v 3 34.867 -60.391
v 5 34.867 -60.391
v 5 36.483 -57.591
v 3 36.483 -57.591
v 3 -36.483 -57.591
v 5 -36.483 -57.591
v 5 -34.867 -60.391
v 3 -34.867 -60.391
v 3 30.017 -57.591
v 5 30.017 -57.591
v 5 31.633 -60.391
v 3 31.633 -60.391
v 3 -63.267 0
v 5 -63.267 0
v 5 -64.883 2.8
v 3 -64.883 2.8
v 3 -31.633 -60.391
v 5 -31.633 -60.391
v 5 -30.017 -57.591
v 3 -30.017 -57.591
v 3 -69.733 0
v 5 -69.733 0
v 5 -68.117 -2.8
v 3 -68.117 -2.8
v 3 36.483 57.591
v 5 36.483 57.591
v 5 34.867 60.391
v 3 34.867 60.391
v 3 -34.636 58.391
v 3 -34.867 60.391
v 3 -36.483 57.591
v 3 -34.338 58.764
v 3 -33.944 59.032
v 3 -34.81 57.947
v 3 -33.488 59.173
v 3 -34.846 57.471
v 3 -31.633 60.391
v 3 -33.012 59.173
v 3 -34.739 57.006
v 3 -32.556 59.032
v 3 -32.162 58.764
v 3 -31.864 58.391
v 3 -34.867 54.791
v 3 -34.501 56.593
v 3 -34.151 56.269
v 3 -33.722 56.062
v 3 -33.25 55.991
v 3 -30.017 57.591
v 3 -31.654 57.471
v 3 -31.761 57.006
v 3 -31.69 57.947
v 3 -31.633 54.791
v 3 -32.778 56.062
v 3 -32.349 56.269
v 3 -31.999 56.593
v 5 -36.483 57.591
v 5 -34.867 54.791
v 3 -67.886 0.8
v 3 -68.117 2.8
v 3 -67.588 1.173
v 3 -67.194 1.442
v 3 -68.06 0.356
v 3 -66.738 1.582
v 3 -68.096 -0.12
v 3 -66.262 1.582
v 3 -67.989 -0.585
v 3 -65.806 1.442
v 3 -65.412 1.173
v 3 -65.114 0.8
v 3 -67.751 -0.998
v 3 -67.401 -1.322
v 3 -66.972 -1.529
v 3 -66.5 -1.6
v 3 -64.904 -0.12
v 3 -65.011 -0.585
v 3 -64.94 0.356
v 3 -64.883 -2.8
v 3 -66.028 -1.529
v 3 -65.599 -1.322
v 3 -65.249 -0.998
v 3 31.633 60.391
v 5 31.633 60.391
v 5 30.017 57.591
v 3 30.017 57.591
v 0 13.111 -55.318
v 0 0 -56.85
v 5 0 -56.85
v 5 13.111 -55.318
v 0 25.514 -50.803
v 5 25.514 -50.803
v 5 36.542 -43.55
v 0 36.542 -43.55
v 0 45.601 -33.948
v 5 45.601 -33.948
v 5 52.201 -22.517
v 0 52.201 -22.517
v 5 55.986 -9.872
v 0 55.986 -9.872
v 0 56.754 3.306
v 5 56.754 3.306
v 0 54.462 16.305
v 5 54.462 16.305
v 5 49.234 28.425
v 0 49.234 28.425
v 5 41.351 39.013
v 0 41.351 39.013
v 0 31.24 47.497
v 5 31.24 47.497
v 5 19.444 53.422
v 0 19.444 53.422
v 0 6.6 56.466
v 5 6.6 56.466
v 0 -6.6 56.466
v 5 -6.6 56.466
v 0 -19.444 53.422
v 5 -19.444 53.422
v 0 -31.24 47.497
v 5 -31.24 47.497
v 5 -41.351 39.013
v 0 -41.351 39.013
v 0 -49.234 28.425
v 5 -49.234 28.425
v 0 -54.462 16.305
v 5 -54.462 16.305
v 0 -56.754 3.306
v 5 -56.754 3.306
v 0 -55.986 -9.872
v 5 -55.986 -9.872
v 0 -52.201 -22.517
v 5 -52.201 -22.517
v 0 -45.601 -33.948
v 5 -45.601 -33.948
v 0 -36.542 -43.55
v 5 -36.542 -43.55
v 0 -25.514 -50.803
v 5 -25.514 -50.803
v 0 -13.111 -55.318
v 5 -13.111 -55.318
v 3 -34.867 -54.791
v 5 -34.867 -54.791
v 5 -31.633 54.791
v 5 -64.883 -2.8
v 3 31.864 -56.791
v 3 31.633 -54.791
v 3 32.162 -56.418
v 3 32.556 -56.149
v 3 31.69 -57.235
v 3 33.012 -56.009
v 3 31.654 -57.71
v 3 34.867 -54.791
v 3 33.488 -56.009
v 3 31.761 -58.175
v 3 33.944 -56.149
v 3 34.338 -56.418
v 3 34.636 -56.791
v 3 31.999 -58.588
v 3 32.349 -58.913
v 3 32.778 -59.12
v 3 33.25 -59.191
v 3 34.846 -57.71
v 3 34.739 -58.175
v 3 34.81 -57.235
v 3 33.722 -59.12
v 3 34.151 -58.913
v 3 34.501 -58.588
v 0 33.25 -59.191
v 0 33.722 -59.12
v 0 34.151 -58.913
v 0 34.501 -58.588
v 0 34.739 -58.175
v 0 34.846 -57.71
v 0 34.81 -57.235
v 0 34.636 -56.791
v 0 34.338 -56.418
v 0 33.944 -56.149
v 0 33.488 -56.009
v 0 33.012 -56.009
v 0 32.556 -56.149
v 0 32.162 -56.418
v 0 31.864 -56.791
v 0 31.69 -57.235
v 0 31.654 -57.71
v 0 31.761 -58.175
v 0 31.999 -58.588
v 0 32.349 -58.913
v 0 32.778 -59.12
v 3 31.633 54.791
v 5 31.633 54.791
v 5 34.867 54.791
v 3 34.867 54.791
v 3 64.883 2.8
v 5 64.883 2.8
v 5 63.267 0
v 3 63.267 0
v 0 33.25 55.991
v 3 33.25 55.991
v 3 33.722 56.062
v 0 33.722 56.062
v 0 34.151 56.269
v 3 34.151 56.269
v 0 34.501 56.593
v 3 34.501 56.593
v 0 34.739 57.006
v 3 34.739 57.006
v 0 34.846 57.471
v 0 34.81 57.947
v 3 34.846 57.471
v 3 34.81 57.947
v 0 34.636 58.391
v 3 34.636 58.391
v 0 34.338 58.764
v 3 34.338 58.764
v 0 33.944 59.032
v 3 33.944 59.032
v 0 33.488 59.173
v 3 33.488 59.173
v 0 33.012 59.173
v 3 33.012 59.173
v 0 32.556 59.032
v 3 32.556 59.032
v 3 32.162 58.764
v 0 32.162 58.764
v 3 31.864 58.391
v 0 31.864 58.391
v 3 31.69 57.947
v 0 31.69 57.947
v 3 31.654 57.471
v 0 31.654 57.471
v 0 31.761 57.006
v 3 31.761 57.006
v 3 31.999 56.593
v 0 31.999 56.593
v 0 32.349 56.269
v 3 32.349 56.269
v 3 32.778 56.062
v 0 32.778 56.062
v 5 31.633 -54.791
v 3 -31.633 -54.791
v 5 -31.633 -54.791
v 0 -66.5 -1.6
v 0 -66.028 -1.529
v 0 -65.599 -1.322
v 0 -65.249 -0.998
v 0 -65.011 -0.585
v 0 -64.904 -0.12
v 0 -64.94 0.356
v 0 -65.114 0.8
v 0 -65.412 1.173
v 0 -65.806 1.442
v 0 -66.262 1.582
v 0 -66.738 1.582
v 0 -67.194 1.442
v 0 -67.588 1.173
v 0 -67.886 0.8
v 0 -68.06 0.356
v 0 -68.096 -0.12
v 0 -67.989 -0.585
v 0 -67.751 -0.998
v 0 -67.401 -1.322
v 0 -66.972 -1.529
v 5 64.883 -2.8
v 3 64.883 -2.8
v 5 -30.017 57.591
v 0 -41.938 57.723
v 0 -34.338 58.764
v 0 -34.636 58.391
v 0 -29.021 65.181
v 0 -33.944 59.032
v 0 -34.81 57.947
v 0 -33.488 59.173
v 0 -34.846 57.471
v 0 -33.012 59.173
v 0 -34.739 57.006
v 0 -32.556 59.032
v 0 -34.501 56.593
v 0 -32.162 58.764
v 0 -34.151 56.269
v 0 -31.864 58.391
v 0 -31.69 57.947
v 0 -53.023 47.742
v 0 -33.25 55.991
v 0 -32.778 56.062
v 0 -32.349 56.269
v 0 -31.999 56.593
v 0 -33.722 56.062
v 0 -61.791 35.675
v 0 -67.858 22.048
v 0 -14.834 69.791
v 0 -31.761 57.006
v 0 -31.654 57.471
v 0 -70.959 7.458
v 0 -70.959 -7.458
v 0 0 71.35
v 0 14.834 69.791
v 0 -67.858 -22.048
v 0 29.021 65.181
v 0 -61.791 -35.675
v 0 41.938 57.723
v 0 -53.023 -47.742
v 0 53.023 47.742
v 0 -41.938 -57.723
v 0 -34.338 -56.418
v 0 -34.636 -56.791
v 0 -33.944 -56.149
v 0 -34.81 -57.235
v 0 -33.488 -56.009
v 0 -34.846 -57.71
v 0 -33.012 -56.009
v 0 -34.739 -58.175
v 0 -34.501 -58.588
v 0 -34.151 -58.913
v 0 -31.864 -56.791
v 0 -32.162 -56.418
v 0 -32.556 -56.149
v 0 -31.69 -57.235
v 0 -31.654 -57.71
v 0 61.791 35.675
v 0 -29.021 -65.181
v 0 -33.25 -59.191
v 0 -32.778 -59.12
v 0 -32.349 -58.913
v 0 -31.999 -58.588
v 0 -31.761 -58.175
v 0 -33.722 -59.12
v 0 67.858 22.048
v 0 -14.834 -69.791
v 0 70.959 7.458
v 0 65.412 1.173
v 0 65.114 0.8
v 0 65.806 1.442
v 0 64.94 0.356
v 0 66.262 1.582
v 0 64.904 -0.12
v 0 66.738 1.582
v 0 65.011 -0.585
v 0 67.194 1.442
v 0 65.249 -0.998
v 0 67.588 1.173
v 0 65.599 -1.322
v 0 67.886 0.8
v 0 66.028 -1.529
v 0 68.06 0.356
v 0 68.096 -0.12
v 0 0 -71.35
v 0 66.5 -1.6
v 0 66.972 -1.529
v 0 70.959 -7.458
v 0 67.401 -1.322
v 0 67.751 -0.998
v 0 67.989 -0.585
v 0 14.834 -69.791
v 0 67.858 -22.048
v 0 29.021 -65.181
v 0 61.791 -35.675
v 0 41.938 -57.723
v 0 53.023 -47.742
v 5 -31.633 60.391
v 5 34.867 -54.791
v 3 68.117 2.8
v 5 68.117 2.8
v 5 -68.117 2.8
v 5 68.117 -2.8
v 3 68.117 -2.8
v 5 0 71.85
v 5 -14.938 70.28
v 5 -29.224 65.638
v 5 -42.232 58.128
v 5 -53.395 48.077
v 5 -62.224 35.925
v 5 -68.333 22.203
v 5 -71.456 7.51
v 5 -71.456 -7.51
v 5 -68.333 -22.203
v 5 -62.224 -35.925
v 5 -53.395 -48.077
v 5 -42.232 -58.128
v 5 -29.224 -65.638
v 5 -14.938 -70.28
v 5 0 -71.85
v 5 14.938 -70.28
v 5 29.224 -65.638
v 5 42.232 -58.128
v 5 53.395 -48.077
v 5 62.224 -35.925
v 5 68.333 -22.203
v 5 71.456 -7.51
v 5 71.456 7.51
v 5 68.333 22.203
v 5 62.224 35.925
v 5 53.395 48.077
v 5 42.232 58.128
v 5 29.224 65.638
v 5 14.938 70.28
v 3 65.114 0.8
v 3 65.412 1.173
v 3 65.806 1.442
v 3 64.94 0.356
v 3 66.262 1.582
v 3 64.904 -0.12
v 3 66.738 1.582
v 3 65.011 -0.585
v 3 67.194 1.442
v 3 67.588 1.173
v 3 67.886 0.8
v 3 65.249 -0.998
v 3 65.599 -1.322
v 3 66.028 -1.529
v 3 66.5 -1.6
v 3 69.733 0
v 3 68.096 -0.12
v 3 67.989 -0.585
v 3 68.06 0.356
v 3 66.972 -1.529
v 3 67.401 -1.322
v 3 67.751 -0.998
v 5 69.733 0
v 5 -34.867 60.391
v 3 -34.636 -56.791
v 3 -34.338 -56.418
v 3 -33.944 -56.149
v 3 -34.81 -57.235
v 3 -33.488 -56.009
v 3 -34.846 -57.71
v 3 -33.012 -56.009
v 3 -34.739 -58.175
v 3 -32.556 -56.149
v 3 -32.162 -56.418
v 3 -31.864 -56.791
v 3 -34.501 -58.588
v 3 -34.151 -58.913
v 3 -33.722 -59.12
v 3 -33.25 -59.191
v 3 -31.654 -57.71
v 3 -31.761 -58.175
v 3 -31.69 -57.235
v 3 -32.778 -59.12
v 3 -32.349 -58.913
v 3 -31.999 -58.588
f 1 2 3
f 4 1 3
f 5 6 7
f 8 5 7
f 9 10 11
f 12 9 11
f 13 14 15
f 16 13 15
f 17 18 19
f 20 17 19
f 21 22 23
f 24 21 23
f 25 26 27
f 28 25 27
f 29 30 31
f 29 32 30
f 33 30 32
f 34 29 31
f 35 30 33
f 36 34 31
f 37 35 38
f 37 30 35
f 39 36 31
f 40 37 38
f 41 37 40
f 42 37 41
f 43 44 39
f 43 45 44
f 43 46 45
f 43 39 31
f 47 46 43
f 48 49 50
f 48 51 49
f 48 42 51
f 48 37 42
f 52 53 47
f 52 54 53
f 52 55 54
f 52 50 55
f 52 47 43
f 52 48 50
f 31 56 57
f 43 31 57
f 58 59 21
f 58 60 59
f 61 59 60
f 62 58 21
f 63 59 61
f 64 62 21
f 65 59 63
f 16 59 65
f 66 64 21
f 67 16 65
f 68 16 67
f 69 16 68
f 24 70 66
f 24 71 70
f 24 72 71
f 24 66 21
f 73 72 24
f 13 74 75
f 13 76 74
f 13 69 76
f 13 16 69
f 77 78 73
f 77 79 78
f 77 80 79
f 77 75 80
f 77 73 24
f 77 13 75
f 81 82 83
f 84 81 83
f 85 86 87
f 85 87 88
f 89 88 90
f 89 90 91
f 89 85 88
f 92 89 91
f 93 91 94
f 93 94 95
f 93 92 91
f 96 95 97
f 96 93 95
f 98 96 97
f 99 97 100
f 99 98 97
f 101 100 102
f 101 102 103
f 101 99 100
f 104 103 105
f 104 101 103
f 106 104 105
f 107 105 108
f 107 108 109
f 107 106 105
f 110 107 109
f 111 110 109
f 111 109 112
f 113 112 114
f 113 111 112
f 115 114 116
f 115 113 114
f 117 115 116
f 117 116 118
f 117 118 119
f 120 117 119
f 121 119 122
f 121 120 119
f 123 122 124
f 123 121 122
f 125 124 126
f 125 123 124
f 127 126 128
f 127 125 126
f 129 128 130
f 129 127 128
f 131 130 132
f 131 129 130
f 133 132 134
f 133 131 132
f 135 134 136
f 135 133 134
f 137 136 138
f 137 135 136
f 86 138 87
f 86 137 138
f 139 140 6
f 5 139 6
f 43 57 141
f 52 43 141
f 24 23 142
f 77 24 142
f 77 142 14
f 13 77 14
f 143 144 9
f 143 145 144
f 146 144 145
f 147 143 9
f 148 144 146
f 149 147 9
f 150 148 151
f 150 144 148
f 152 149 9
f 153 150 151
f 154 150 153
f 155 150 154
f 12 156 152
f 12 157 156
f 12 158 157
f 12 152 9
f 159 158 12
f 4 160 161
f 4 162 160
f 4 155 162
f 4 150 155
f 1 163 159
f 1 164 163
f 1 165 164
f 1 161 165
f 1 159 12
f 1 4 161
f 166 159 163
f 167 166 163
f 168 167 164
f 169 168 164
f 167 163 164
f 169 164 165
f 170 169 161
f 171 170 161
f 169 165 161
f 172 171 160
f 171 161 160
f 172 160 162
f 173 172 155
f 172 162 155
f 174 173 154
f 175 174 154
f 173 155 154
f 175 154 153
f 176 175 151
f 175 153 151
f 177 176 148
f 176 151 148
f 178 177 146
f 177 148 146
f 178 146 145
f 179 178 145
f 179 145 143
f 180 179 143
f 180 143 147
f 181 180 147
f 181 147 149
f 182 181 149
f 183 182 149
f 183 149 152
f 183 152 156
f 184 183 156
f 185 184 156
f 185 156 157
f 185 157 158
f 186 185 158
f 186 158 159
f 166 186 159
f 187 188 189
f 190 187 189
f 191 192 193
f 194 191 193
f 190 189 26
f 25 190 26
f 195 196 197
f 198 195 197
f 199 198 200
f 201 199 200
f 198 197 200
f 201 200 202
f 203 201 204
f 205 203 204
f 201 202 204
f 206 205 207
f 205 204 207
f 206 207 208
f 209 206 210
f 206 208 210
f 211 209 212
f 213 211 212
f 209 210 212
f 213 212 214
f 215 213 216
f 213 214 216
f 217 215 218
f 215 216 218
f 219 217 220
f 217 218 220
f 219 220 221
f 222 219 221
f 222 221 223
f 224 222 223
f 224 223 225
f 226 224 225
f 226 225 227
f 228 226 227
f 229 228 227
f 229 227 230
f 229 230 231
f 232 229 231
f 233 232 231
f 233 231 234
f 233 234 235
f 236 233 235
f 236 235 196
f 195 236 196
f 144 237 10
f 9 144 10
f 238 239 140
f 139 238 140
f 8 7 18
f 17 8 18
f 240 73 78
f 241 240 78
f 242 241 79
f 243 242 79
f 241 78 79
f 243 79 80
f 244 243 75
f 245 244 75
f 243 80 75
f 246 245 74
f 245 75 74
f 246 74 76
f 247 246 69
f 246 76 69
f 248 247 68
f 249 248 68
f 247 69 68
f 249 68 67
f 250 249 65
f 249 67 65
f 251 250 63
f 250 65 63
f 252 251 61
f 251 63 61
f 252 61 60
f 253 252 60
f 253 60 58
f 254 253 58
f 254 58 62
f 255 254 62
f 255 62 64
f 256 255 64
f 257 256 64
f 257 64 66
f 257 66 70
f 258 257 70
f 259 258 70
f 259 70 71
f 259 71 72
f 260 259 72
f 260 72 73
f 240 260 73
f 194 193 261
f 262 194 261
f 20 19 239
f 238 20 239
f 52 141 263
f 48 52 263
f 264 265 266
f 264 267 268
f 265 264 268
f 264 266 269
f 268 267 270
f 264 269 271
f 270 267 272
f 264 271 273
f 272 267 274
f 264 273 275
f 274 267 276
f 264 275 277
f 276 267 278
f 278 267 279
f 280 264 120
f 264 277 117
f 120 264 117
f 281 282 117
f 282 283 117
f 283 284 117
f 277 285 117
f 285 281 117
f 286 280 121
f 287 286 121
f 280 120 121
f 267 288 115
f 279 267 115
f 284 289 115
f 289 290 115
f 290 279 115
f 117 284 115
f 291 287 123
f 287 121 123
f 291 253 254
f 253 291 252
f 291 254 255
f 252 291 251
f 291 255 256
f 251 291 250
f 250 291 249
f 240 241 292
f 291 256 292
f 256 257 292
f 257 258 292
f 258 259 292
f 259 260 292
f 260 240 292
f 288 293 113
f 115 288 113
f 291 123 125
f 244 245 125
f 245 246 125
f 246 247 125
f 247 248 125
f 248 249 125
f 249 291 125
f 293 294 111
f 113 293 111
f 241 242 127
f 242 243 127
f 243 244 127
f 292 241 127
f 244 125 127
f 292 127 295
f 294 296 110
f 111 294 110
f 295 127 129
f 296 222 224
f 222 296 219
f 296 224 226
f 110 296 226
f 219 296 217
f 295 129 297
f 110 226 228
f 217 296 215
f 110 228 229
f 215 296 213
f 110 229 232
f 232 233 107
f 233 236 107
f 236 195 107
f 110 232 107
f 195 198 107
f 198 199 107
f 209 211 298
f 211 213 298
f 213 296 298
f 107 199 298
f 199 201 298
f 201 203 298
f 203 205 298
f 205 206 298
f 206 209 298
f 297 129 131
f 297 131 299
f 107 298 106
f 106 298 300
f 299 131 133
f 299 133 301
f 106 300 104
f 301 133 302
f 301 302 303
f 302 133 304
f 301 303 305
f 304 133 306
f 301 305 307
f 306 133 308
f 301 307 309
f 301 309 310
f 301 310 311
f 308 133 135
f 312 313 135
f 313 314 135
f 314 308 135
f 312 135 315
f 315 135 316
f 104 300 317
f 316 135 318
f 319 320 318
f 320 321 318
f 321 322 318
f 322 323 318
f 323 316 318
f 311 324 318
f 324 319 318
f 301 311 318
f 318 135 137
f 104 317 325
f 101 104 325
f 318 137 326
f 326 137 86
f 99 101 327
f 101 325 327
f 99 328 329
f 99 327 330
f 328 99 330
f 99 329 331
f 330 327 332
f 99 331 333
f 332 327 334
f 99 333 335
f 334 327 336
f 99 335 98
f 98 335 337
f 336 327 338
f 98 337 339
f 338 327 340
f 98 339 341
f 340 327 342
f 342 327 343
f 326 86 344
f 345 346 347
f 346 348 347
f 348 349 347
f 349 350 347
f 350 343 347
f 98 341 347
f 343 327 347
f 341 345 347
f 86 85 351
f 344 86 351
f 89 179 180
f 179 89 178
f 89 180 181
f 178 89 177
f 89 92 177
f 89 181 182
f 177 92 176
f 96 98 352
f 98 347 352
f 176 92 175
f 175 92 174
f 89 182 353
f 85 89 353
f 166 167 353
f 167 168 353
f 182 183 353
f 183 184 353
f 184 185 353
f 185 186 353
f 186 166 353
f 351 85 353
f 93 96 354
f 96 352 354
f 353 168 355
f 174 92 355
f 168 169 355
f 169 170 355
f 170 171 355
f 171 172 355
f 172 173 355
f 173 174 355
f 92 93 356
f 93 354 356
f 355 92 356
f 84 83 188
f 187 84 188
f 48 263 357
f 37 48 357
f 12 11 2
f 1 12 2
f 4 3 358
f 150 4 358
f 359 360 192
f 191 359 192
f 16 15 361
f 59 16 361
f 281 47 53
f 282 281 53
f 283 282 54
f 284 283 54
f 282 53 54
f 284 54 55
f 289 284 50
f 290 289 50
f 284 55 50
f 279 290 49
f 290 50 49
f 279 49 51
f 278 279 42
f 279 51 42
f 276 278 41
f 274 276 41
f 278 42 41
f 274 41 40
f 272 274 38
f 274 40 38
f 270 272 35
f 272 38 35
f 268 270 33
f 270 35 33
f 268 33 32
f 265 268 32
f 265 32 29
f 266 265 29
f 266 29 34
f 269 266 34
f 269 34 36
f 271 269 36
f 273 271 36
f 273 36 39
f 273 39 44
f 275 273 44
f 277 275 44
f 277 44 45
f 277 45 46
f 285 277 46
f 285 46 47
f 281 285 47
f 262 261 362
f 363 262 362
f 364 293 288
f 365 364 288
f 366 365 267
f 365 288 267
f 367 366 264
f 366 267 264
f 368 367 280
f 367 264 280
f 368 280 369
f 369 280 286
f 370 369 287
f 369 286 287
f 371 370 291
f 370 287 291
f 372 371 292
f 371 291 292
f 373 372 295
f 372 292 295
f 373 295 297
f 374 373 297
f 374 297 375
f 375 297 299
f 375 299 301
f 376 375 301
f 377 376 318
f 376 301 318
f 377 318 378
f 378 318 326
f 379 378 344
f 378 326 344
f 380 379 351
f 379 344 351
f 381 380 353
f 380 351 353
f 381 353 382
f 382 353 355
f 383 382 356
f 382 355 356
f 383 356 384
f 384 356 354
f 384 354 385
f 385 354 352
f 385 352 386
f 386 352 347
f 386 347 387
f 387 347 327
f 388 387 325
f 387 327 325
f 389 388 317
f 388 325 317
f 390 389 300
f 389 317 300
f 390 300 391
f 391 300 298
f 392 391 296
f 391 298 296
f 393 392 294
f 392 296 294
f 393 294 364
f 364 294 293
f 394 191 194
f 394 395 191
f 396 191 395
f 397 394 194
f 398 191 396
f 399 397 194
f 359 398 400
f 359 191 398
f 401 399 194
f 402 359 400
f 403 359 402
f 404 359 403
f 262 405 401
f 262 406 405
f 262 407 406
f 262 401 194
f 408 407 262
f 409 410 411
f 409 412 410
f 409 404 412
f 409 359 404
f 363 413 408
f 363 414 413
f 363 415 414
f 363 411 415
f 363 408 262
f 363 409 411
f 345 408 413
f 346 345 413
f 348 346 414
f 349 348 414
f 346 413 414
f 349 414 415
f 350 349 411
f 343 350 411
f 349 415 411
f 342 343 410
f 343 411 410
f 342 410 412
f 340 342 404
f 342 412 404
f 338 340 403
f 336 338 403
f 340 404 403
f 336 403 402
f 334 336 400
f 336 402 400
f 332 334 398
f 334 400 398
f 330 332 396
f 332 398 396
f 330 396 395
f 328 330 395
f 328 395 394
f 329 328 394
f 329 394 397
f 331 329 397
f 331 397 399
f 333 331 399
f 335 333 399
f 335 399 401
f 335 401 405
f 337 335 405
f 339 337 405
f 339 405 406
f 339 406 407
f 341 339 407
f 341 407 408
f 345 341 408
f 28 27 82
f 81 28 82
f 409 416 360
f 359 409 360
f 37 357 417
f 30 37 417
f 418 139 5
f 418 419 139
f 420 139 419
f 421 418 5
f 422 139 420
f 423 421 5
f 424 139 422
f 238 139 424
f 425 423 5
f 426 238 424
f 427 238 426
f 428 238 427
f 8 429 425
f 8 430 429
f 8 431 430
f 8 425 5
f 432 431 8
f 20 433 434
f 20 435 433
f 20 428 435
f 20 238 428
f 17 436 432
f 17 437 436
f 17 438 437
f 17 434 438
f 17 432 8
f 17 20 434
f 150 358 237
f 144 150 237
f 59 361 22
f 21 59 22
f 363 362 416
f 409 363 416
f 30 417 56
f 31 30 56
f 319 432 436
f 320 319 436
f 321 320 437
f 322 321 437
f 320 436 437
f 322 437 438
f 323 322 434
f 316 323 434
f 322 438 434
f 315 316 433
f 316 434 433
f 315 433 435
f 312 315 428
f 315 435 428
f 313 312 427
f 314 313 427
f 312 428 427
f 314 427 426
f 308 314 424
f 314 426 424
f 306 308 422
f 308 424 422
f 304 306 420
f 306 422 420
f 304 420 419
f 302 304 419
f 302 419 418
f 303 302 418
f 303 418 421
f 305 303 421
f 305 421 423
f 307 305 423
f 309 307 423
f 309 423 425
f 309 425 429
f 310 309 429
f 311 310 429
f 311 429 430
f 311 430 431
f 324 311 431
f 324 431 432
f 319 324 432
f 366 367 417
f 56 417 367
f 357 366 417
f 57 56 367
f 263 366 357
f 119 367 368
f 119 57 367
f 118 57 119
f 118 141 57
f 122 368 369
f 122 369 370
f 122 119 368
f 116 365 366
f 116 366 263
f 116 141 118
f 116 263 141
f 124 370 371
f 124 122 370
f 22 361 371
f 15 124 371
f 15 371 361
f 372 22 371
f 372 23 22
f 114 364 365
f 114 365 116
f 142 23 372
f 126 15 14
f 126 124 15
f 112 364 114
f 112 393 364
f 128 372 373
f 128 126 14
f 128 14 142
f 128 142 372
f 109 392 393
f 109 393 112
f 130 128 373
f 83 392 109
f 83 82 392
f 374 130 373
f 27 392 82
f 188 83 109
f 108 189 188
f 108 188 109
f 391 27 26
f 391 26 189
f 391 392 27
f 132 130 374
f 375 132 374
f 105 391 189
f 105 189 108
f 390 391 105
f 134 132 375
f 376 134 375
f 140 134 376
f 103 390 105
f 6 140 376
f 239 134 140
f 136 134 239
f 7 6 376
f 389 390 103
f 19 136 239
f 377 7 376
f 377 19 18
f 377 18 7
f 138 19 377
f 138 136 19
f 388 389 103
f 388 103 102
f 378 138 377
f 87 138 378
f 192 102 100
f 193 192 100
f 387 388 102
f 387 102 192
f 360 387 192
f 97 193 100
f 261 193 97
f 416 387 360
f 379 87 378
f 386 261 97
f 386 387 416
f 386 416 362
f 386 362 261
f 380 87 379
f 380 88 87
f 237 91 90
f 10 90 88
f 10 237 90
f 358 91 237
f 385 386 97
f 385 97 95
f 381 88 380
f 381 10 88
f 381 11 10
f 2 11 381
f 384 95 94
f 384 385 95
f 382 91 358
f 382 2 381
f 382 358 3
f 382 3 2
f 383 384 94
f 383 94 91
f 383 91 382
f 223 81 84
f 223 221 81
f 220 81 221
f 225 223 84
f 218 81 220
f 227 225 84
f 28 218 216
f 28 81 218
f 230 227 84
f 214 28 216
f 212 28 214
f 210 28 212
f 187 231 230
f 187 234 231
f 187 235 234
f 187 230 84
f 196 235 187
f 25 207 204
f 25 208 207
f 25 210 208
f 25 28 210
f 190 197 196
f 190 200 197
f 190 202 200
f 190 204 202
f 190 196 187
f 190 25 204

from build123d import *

# Parameters (mm, degrees)
SKETCH1_R           = 71.85
SKETCH1_R_2         = 56.85
BOSS_EXTRUDE1_DEPTH = 5
CUT_EXTRUDE1_DEPTH  = 2
CUT_EXTRUDE2_REACH  = 103.734
SKETCH3_R           = 1.6


with BuildPart() as part:
    # Sketch1 → Boss-Extrude1 (new body)
    with BuildSketch(Plane(origin=(0, 0, 0), x_dir=(0, 0, -1), z_dir=(1, 0, 0))):
        Circle(SKETCH1_R)
        Circle(SKETCH1_R_2, mode=Mode.SUBTRACT)
    extrude(amount=BOSS_EXTRUDE1_DEPTH)

    # Sketch2 → Cut-Extrude1 (cut)
    with BuildSketch(Plane(origin=(5, 0, 0), x_dir=(0, 0, -1), z_dir=(1, 0, 0))):
        Polygon((54.790689352, 31.633419246), (57.590689352, 30.016838493), (60.390689352, 31.633419246), (60.390689352, 34.866580754), (57.590689352, 36.483161507), (54.790689352, 34.866580754), align=None)
        Polygon((0, 63.266838493), (2.8, 64.883419246), (2.8, 68.116580754), (0, 69.733161507), (-2.8, 68.116580754), (-2.8, 64.883419246), align=None)
        Polygon((54.790689352, -31.633419246), (54.790689352, -34.866580754), (57.590689352, -36.483161507), (60.390689352, -34.866580754), (60.390689352, -31.633419246), (57.590689352, -30.016838493), align=None)
        Polygon((0, -63.266838493), (-2.8, -64.883419246), (-2.8, -68.116580754), (0, -69.733161507), (2.8, -68.116580754), (2.8, -64.883419246), align=None)
        Polygon((-54.790689352, -31.633419246), (-57.590689352, -30.016838493), (-60.390689352, -31.633419246), (-60.390689352, -34.866580754), (-57.590689352, -36.483161507), (-54.790689352, -34.866580754), align=None)
        Polygon((-54.790689352, 31.633419246), (-54.790689352, 34.866580754), (-57.590689352, 36.483161507), (-60.390689352, 34.866580754), (-60.390689352, 31.633419246), (-57.590689352, 30.016838493), align=None)
    extrude(amount=-CUT_EXTRUDE1_DEPTH, mode=Mode.SUBTRACT)

    # Sketch3 → Cut-Extrude2 (cut, up to next)
    with BuildSketch(Plane(origin=(5, 0, 0), x_dir=(0, 0, -1), z_dir=(1, 0, 0)), mode=Mode.PRIVATE) as cut_extrude2_sk1:
        with Locations((0, 66.5)):
            Circle(SKETCH3_R)
    cut_extrude2_tool1 = extrude(cut_extrude2_sk1.sketch, amount=-CUT_EXTRUDE2_REACH, mode=Mode.PRIVATE) & part.part
    # Sketch3 → Cut-Extrude2 (cut, up to next)
    with BuildSketch(Plane(origin=(5, 0, 0), x_dir=(0, 0, -1), z_dir=(1, 0, 0)), mode=Mode.PRIVATE) as cut_extrude2_sk2:
        with Locations((57.590689352, 33.25)):
            Circle(SKETCH3_R)
    cut_extrude2_tool2 = extrude(cut_extrude2_sk2.sketch, amount=-CUT_EXTRUDE2_REACH, mode=Mode.PRIVATE) & part.part
    # Sketch3 → Cut-Extrude2 (cut, up to next)
    with BuildSketch(Plane(origin=(5, 0, 0), x_dir=(0, 0, -1), z_dir=(1, 0, 0)), mode=Mode.PRIVATE) as cut_extrude2_sk3:
        with Locations((57.590689352, -33.25)):
            Circle(SKETCH3_R)
    cut_extrude2_tool3 = extrude(cut_extrude2_sk3.sketch, amount=-CUT_EXTRUDE2_REACH, mode=Mode.PRIVATE) & part.part
    # Sketch3 → Cut-Extrude2 (cut, up to next)
    with BuildSketch(Plane(origin=(5, 0, 0), x_dir=(0, 0, -1), z_dir=(1, 0, 0)), mode=Mode.PRIVATE) as cut_extrude2_sk4:
        with Locations((0, -66.5)):
            Circle(SKETCH3_R)
    cut_extrude2_tool4 = extrude(cut_extrude2_sk4.sketch, amount=-CUT_EXTRUDE2_REACH, mode=Mode.PRIVATE) & part.part
    # Sketch3 → Cut-Extrude2 (cut, up to next)
    with BuildSketch(Plane(origin=(5, 0, 0), x_dir=(0, 0, -1), z_dir=(1, 0, 0)), mode=Mode.PRIVATE) as cut_extrude2_sk5:
        with Locations((-57.590689352, -33.25)):
            Circle(SKETCH3_R)
    cut_extrude2_tool5 = extrude(cut_extrude2_sk5.sketch, amount=-CUT_EXTRUDE2_REACH, mode=Mode.PRIVATE) & part.part
    # Sketch3 → Cut-Extrude2 (cut, up to next)
    with BuildSketch(Plane(origin=(5, 0, 0), x_dir=(0, 0, -1), z_dir=(1, 0, 0)), mode=Mode.PRIVATE) as cut_extrude2_sk6:
        with Locations((-57.590689352, 33.25)):
            Circle(SKETCH3_R)
    cut_extrude2_tool6 = extrude(cut_extrude2_sk6.sketch, amount=-CUT_EXTRUDE2_REACH, mode=Mode.PRIVATE) & part.part
    add(cut_extrude2_tool1.solids().sort_by_distance((5, 66.5, 0))[0], mode=Mode.SUBTRACT)
    add(cut_extrude2_tool2.solids().sort_by_distance((5, 33.25, -57.590689))[0], mode=Mode.SUBTRACT)
    add(cut_extrude2_tool3.solids().sort_by_distance((5, -33.25, -57.590689))[0], mode=Mode.SUBTRACT)
    add(cut_extrude2_tool4.solids().sort_by_distance((5, -66.5, 0))[0], mode=Mode.SUBTRACT)
    add(cut_extrude2_tool5.solids().sort_by_distance((5, -33.25, 57.590689))[0], mode=Mode.SUBTRACT)
    add(cut_extrude2_tool6.solids().sort_by_distance((5, 33.25, 57.590689))[0], mode=Mode.SUBTRACT)

    # Sketch4 → Cut-Revolve1 (revolve, cut)
    with BuildSketch(Plane.XY, mode=Mode.PRIVATE) as cut_revolve1_sk:
        Polygon((0, -71.35), (0, -71.85), (5, -71.85), align=None)
    revolve(cut_revolve1_sk.sketch.rotate(Axis((0, 0, 0), (1, 0, 0)), 270), axis=Axis((0, 0, 0), (1, 0, 0)), mode=Mode.SUBTRACT)


solid = part.part
